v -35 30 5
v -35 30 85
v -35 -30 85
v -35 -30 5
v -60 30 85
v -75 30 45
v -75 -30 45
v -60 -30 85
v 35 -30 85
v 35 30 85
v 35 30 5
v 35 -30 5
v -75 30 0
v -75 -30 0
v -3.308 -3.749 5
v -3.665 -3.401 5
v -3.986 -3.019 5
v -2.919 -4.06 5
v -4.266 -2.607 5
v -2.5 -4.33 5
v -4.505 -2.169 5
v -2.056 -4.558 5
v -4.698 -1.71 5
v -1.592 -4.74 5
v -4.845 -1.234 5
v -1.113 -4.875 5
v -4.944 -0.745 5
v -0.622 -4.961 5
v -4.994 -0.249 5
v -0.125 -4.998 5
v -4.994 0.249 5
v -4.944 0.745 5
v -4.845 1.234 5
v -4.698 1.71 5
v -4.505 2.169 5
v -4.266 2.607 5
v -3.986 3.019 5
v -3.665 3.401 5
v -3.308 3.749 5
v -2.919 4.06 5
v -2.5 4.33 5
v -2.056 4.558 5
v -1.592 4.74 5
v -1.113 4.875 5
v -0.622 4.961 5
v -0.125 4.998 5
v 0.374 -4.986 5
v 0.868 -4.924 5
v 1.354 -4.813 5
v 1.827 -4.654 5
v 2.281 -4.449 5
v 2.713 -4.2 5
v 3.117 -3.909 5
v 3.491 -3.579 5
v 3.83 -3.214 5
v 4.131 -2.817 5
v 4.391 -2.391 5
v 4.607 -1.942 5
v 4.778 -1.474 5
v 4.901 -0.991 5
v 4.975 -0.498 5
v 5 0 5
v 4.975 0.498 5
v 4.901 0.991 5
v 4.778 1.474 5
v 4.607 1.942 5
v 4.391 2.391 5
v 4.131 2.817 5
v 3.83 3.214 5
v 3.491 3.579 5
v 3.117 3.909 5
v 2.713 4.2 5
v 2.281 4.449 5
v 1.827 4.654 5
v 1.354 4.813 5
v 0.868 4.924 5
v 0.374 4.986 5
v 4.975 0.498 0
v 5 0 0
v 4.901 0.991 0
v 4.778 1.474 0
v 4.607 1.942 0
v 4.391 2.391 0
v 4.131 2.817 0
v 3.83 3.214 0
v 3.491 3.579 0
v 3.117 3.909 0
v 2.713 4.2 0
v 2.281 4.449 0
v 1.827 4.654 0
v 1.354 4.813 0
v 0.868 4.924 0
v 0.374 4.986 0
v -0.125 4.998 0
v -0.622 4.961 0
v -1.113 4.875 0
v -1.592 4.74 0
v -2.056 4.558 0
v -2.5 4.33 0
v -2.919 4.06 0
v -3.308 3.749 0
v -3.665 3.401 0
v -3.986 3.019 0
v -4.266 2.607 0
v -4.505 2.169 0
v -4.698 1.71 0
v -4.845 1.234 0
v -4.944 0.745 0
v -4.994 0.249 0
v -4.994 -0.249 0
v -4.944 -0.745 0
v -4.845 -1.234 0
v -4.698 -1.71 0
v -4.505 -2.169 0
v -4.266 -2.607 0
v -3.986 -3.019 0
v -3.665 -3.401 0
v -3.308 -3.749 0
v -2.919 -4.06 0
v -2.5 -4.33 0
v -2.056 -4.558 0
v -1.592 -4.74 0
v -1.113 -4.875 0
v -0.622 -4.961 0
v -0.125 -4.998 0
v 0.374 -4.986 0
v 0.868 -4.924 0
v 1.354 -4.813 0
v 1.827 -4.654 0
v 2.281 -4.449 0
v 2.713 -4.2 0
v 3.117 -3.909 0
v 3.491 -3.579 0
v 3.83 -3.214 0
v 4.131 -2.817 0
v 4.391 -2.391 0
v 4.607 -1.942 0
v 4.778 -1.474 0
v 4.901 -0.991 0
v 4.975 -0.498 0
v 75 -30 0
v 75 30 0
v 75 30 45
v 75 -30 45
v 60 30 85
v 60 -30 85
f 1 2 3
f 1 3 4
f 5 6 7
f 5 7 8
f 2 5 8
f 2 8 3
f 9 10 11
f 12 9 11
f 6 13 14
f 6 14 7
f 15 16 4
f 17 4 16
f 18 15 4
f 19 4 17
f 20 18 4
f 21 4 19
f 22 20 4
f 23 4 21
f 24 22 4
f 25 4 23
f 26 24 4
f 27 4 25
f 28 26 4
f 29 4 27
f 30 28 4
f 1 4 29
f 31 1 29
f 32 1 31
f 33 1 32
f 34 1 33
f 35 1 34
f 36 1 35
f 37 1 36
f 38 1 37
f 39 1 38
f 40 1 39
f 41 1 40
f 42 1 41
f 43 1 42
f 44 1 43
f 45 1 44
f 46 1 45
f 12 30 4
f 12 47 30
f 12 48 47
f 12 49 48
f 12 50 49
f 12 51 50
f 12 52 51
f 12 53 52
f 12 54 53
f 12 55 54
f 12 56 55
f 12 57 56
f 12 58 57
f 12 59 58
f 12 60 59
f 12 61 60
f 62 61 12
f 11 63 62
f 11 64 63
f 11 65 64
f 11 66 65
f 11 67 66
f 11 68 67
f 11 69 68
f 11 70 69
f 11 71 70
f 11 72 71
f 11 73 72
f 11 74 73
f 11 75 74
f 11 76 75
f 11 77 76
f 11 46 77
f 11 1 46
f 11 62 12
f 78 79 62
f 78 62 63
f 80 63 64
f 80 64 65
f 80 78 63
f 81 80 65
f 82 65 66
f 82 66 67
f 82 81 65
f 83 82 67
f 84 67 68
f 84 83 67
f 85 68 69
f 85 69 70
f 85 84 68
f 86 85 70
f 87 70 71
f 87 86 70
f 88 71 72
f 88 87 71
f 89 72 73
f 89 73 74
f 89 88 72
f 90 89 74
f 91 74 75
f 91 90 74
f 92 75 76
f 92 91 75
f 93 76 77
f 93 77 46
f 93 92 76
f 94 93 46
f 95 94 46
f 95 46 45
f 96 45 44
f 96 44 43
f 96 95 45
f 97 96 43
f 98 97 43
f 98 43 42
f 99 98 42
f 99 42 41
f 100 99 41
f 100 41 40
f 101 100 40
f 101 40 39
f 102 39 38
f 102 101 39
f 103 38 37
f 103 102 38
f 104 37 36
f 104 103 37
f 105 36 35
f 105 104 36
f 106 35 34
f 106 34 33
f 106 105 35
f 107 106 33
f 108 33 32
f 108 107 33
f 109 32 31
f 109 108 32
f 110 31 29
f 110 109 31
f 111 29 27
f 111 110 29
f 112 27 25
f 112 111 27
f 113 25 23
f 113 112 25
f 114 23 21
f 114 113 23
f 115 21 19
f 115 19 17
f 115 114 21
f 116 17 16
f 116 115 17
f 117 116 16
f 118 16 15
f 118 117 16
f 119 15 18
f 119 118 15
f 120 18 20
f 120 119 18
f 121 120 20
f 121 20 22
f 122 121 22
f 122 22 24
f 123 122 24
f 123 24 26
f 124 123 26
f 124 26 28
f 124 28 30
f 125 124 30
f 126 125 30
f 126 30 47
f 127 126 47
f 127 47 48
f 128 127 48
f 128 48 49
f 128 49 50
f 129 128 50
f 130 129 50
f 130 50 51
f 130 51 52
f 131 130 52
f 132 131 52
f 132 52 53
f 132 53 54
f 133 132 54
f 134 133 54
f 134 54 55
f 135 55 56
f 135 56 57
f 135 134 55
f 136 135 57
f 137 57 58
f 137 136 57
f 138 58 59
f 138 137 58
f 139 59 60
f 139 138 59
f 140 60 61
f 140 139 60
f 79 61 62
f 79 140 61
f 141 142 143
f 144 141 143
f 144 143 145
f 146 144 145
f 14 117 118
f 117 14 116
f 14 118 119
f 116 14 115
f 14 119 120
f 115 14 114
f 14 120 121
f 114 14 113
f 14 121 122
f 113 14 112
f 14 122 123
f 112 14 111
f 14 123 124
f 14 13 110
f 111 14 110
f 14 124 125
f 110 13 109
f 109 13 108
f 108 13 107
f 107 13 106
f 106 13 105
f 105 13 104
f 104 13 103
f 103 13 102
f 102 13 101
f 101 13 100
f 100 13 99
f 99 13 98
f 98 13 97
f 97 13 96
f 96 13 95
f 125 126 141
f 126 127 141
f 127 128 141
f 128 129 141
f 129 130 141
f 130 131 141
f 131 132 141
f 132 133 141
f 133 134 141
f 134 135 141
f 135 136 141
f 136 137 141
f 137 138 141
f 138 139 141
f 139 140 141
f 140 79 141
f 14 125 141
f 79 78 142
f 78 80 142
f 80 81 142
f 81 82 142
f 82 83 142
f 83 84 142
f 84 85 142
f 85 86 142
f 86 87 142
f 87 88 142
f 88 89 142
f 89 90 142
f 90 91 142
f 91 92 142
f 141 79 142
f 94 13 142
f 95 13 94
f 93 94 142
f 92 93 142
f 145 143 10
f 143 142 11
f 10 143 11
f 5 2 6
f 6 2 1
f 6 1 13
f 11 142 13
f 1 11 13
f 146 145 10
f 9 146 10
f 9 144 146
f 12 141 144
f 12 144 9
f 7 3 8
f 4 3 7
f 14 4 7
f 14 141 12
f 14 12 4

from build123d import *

# Parameters (mm, degrees)
SKETCH1_W           = 150
SKETCH1_H           = 60
SKETCH1_R           = 5
BOSS_EXTRUDE1_DEPTH = 5
BOSS_EXTRUDE2_DEPTH = 60


with BuildPart() as part:
    # Sketch1 → Boss-Extrude1 (new body)
    with BuildSketch(Plane.XY):
        Rectangle(SKETCH1_W, SKETCH1_H)
        Circle(SKETCH1_R, mode=Mode.SUBTRACT)
    extrude(amount=BOSS_EXTRUDE1_DEPTH)

    # Sketch2 → Boss-Extrude2 (add)
    with BuildSketch(Plane(origin=(0, 30, 0), x_dir=(1, 0, 0), z_dir=(0, 1, 0))):
        Polygon((-35, -85), (-35, -5), (-75, -5), (-75, -45), (-60, -85), align=None)
    boss_extrude2 = extrude(amount=-BOSS_EXTRUDE2_DEPTH)

    # Mirror1: Boss-Extrude2 across plane
    add(boss_extrude2.mirror(Plane(origin=(0, 0, 0), x_dir=(0, 0, 1), z_dir=(1, 0, 0))))


solid = part.part
